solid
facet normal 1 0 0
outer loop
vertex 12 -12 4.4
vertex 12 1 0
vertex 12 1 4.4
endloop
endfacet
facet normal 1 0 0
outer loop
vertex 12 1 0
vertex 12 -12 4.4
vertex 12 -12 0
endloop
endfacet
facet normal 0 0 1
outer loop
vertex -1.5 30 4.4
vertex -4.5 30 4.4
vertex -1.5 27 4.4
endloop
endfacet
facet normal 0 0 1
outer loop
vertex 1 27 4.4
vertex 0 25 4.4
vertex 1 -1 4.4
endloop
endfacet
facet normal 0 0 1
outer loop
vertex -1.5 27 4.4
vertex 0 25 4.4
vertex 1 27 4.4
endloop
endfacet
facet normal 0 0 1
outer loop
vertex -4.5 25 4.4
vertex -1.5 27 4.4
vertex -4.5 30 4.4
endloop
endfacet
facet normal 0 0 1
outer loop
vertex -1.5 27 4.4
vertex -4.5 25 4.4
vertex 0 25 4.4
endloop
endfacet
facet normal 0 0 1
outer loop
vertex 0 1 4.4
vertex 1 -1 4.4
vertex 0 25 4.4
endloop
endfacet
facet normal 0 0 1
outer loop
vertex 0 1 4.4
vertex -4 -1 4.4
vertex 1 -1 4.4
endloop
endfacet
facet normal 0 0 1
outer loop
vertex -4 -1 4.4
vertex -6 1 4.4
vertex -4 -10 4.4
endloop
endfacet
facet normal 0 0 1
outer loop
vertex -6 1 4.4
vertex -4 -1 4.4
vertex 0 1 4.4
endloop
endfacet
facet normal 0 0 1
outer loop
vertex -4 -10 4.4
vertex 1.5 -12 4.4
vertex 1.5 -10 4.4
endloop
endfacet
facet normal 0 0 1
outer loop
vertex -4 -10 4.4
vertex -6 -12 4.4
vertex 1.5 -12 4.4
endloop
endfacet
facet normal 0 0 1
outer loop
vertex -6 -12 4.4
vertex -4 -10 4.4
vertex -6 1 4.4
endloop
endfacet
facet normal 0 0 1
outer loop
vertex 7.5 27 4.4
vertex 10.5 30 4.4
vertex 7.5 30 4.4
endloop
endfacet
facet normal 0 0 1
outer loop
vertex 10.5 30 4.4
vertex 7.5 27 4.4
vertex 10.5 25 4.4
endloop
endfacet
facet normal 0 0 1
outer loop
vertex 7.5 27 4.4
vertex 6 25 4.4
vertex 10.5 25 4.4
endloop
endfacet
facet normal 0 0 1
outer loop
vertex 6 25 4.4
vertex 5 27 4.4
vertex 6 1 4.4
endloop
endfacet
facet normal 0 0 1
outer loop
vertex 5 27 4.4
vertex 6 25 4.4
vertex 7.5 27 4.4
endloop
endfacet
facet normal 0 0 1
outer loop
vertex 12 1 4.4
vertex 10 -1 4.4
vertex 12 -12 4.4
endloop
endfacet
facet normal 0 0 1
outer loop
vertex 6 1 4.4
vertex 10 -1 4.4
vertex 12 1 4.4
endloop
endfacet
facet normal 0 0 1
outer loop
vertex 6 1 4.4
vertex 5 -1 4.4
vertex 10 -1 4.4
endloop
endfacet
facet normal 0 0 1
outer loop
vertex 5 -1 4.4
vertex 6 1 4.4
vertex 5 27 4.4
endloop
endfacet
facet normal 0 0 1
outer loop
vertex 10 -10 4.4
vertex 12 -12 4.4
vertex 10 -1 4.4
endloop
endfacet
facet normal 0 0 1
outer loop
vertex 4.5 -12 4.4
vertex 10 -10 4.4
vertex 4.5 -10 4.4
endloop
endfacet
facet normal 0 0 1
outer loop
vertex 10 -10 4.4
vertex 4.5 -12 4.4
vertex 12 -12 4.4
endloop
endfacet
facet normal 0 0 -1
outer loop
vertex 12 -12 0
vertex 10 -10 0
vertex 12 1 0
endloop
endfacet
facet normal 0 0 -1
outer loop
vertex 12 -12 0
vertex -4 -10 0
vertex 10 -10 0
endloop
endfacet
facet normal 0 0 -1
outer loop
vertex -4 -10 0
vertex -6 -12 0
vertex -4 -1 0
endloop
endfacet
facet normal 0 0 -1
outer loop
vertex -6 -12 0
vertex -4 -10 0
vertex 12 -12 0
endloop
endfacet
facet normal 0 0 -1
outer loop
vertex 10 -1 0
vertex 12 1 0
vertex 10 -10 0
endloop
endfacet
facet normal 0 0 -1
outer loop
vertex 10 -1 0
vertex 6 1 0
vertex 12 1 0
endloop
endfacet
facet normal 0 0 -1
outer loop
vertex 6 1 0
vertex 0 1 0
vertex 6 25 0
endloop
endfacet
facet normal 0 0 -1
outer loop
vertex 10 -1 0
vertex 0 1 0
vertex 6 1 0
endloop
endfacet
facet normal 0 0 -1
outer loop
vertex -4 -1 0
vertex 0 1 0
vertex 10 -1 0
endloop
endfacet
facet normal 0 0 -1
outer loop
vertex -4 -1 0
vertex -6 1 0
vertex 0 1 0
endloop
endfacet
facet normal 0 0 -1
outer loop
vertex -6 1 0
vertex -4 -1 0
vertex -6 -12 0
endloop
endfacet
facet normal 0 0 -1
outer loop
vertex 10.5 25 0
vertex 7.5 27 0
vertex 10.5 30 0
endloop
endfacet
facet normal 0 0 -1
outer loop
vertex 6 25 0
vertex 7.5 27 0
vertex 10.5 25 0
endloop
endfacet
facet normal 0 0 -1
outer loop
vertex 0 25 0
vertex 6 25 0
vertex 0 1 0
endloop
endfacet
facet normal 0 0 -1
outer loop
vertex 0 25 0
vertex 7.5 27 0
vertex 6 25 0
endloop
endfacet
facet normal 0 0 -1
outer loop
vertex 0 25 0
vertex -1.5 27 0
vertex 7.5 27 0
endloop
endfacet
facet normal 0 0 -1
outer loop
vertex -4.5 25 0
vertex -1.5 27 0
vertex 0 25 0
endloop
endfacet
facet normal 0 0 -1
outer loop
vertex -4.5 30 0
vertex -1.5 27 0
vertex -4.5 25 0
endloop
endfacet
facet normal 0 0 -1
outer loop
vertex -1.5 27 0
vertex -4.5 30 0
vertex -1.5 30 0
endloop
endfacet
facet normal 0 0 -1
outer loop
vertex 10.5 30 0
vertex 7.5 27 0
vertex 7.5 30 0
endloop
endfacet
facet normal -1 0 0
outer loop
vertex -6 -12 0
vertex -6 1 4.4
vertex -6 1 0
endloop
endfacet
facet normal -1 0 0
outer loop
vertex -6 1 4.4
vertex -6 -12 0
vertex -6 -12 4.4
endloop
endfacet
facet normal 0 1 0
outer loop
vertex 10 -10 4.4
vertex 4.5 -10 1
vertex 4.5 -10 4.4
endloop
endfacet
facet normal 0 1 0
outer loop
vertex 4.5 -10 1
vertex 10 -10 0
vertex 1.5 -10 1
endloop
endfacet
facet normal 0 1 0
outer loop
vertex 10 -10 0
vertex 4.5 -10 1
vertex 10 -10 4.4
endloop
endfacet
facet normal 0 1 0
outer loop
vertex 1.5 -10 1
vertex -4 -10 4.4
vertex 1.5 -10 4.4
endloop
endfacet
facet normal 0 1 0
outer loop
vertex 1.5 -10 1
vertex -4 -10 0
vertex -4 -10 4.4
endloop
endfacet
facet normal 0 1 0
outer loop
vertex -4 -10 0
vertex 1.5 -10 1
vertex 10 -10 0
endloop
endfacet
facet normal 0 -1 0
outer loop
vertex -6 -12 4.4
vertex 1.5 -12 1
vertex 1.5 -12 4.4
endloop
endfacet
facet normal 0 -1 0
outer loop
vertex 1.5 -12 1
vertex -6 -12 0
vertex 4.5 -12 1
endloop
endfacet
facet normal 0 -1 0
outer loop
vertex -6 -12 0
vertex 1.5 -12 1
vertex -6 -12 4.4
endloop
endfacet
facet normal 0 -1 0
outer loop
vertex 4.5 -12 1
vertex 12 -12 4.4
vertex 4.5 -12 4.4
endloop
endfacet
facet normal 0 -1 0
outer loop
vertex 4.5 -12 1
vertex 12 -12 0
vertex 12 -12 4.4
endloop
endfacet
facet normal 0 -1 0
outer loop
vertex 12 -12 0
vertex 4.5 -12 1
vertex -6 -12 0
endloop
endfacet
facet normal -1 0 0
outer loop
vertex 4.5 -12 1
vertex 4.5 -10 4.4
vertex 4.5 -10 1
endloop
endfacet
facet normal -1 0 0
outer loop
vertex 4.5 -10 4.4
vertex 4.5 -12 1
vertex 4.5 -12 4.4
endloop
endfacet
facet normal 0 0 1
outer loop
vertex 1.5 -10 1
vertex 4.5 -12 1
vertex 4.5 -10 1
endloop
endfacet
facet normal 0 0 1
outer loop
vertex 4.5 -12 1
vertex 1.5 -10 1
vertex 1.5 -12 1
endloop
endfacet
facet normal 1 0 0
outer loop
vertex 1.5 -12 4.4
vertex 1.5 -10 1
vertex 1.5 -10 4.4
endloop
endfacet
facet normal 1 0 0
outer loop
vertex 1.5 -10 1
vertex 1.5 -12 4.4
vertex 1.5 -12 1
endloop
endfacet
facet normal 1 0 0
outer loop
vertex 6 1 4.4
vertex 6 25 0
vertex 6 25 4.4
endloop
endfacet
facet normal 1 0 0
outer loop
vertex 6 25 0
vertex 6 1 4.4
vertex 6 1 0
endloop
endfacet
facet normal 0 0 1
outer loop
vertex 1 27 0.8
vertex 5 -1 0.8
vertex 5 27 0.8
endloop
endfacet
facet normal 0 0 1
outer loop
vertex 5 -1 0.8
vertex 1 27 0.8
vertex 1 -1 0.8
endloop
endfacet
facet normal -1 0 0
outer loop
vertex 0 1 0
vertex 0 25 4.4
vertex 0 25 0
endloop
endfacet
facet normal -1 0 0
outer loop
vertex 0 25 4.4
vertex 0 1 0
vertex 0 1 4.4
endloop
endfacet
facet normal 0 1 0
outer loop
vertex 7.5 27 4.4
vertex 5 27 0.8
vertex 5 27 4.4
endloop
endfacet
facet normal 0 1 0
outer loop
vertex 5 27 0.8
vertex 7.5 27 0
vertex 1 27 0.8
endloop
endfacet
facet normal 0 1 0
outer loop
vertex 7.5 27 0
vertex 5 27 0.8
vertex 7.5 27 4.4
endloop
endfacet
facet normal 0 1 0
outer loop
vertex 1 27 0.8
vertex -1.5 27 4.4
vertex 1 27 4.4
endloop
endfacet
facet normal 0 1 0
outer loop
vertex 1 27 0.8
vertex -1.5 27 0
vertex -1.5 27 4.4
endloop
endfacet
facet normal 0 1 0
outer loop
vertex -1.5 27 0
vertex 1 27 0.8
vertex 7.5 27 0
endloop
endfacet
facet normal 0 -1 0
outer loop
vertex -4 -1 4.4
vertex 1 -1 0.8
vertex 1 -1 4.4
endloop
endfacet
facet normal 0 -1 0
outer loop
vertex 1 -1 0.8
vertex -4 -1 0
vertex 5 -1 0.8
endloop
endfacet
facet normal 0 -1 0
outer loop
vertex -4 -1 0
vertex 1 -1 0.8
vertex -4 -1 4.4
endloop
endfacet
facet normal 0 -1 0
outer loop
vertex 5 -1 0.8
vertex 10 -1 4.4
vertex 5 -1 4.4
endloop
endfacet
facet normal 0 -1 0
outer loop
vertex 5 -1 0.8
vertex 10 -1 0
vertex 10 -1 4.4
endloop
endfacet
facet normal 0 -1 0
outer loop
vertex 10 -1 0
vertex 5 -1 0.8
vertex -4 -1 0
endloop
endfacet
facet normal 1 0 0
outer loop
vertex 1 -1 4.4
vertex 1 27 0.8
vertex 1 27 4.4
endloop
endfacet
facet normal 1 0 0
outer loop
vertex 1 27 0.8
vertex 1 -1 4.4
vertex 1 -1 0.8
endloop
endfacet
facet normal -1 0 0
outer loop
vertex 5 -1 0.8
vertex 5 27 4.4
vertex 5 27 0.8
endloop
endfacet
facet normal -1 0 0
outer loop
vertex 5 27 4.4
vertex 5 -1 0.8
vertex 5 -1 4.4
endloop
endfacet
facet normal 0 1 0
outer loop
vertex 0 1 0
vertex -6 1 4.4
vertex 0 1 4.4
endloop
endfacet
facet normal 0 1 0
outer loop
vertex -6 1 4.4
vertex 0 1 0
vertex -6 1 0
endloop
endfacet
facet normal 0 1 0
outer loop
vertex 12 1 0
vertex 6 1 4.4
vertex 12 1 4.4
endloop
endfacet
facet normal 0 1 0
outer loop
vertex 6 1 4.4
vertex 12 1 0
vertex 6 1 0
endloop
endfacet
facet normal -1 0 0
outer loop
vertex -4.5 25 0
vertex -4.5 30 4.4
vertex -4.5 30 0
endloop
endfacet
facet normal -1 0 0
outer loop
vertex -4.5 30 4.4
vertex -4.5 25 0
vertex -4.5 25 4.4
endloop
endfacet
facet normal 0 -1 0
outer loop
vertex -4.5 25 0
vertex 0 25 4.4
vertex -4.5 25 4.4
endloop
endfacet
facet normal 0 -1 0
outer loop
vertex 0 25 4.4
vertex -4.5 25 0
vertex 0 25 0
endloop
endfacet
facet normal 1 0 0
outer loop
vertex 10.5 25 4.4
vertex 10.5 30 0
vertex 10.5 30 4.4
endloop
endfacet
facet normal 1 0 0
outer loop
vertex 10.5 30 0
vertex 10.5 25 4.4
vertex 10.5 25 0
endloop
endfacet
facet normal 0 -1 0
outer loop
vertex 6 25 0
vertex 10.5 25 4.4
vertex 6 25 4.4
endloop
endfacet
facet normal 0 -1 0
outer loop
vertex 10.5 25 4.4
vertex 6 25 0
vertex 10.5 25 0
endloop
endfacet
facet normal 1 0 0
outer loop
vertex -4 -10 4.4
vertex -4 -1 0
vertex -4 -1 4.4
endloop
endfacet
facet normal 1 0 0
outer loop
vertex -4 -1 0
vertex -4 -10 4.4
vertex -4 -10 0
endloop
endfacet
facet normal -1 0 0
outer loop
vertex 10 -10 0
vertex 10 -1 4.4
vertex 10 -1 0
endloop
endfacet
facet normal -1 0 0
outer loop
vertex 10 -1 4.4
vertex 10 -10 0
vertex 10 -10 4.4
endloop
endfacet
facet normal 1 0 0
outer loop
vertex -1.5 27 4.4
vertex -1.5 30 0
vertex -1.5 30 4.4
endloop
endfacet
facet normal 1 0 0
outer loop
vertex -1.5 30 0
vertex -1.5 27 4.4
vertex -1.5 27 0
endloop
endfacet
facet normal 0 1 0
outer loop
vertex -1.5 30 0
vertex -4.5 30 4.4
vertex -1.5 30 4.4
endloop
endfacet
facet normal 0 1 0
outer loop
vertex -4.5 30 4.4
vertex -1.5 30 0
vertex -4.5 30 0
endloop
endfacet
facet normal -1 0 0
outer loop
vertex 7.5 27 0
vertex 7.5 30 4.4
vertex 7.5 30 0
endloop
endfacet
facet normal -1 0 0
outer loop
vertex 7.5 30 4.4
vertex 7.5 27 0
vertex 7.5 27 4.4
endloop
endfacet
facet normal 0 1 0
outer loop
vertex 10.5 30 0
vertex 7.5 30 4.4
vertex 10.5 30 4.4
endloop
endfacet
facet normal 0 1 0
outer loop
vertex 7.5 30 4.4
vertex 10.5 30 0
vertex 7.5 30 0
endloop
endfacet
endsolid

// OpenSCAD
translate(v=[0,-1,0])
  cube(size=[6,28,0.8]);
cube(size=[1,26,4.4]);
translate(v=[5,0,0])
  cube(size=[1,26,4.4]);

translate(v=[-6,-1,0])
  cube(size=[7,2,4.4]);
translate(v=[5,-1,0])
  cube(size=[7,2,4.4]);

translate(v=[-4.5,25,0])
  cube(size=[5.5,2,4.4]);
translate(v=[5,25,0])
  cube(size=[5.5,2,4.4]);

/* Add a base */

translate(v=[-6,-10,0])
  cube(size=[2.0,10,4.4]);

translate(v=[10,-10,0])
  cube(size=[2.0,10,4.4]);

translate(v=[-6,-12,0])
  difference()
  {
    cube(size=[18,2.0,4.4]);

    translate(v=[7.5,0,1.0])
      cube(size=[3.0,2.0,3.4]);
  }


/* Add a top */

translate(v=[-4.5,27,0])
{
  cube(size=[3,3.0,4.4]);
}

translate(v=[7.5,27,0])
{
  cube(size=[3,3.0,4.4]);
}
